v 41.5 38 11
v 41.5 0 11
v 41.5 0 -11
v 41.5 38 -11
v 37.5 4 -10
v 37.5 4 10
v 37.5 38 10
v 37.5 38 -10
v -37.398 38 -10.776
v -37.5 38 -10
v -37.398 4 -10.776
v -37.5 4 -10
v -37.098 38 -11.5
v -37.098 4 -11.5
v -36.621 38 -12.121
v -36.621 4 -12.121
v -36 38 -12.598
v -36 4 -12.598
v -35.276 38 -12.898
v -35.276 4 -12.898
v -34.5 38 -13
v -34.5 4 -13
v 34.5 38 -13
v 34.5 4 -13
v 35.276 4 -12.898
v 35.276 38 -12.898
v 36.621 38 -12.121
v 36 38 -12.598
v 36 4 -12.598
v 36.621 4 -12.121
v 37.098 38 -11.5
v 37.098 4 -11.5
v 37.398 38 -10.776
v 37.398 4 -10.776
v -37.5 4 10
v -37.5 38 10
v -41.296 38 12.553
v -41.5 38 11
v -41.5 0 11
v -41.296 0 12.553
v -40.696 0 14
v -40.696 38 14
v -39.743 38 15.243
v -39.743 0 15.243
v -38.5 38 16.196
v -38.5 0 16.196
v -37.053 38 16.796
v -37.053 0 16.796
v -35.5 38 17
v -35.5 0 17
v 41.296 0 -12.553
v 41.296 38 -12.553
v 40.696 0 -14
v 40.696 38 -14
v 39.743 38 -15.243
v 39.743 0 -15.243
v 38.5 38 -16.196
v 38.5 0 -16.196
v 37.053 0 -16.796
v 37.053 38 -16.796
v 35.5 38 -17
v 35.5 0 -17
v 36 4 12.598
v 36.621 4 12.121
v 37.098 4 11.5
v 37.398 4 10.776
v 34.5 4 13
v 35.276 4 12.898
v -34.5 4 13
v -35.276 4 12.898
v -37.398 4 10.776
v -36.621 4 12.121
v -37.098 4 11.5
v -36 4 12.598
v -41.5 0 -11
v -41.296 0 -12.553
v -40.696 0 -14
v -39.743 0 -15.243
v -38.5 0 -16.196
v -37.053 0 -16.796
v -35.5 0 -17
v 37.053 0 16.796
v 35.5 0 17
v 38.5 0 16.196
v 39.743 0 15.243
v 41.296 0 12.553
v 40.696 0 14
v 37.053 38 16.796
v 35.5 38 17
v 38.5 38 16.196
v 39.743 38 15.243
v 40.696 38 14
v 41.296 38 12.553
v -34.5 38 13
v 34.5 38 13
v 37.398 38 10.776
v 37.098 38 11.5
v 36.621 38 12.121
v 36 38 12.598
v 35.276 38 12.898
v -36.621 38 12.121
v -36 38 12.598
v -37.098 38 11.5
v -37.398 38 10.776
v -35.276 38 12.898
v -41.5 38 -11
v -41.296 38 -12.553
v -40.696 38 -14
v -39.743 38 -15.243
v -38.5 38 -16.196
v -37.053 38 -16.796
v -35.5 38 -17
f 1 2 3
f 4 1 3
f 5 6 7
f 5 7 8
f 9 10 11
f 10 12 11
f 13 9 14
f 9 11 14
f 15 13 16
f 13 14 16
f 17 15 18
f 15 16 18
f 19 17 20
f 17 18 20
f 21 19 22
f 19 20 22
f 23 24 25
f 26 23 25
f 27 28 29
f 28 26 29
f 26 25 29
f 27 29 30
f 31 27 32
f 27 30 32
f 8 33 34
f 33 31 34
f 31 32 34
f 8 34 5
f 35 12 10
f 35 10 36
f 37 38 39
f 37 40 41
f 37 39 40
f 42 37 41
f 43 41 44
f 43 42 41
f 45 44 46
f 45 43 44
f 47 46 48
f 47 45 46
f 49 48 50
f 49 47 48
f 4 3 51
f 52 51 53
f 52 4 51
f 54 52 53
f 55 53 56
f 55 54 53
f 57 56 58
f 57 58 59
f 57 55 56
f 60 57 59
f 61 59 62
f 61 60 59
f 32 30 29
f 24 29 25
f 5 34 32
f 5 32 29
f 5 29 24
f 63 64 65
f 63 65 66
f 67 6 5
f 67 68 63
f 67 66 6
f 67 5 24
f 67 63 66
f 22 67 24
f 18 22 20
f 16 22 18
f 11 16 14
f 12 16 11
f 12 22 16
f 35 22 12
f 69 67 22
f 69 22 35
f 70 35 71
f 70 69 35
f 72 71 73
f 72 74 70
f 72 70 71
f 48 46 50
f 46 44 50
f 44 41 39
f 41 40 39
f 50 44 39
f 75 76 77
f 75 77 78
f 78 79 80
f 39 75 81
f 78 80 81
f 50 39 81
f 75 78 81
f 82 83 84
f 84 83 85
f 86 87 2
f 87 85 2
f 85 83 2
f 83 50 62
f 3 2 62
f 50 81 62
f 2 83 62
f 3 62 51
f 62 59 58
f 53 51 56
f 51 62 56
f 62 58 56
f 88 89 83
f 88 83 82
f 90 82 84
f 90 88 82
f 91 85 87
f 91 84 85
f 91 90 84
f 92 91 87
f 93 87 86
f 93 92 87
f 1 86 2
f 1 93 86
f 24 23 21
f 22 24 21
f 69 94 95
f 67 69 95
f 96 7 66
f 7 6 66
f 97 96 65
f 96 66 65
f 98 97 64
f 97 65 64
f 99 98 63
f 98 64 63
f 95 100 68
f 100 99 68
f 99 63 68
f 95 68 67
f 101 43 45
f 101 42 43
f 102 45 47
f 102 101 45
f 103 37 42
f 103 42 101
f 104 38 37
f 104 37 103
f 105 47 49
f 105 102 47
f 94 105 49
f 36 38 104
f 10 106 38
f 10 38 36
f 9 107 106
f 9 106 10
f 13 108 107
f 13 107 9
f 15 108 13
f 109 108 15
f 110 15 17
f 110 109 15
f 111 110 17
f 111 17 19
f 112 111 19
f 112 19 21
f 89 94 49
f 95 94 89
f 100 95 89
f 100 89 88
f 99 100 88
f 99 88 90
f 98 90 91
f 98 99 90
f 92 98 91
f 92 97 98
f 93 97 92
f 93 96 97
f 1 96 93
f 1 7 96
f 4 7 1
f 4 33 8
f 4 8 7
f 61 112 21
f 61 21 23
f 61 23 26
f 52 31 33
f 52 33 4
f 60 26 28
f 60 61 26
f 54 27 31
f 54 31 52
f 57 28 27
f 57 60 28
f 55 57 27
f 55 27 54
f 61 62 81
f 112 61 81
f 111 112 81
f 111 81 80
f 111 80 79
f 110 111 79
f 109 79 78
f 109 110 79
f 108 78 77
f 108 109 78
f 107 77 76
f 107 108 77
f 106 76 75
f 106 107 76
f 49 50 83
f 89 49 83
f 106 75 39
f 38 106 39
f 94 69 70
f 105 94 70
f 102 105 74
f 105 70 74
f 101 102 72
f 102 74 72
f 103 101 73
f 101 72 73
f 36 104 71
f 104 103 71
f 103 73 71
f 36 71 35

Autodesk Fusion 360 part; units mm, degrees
sketch "Sketch1" plane through (0, 0, 0) normal (0, 1, 0) x (1, 0, 0) in component "Body"
  line L0 (41.5, 17) -> (-41.5, 17)
  line L1 (-41.5, 17) -> (-41.5, -17)
  line L2 (-41.5, -17) -> (41.5, -17)
  line L3 (41.5, -17) -> (41.5, 17)
  line L4 (41.5, 17) -> (-41.5, -17) construction
  line L5 (-41.5, 17) -> (41.5, -17) construction
  dimension "d1" = 83
  dimension "d2" = 34
extrude "Extrude1" add sketch "Sketch1" along normal blind 38
sketch "Sketch1 (2)" plane through (0, 38, 0) normal (0, 1, 0) x (-1, 0, 0)
  line L0 (-41.5, 17) -> (-41.5, -17)
  line L1 (-41.5, -17) -> (41.5, -17)
  line L2 (41.5, -17) -> (41.5, 17)
  line L3 (41.5, 17) -> (-41.5, 17)
  line L4 (37.5, 13) -> (-37.5, 13)
  line L5 (-37.5, 13) -> (-37.5, -13)
  line L6 (-37.5, -13) -> (37.5, -13)
  line L7 (37.5, -13) -> (37.5, 13)
  dimension "d5" = -4
extrude "Extrude2" cut sketch "Sketch1 (2)" against normal up to surface (34 mm away) contours L4 L5 L6 L7
fillet "Fillet1" radius 3 4 edges at (-37.5, 21, -13) (-37.5, 21, 13) (37.5, 21, -13) (37.5, 21, 13)
fillet "Fillet2" radius 6 4 edges at (-41.5, 19, 17) (41.5, 19, -17) (41.5, 19, 17) (-41.5, 19, -17)
component "Body" placed x (1, 0, 0) y (0, 1, 0) z (0, 0, 1) at (0, 0, 0)
component "Lid" placed x (1, 0, 0) y (0, 1, 0) z (0, 0, 1) at (0, 0, 0)
